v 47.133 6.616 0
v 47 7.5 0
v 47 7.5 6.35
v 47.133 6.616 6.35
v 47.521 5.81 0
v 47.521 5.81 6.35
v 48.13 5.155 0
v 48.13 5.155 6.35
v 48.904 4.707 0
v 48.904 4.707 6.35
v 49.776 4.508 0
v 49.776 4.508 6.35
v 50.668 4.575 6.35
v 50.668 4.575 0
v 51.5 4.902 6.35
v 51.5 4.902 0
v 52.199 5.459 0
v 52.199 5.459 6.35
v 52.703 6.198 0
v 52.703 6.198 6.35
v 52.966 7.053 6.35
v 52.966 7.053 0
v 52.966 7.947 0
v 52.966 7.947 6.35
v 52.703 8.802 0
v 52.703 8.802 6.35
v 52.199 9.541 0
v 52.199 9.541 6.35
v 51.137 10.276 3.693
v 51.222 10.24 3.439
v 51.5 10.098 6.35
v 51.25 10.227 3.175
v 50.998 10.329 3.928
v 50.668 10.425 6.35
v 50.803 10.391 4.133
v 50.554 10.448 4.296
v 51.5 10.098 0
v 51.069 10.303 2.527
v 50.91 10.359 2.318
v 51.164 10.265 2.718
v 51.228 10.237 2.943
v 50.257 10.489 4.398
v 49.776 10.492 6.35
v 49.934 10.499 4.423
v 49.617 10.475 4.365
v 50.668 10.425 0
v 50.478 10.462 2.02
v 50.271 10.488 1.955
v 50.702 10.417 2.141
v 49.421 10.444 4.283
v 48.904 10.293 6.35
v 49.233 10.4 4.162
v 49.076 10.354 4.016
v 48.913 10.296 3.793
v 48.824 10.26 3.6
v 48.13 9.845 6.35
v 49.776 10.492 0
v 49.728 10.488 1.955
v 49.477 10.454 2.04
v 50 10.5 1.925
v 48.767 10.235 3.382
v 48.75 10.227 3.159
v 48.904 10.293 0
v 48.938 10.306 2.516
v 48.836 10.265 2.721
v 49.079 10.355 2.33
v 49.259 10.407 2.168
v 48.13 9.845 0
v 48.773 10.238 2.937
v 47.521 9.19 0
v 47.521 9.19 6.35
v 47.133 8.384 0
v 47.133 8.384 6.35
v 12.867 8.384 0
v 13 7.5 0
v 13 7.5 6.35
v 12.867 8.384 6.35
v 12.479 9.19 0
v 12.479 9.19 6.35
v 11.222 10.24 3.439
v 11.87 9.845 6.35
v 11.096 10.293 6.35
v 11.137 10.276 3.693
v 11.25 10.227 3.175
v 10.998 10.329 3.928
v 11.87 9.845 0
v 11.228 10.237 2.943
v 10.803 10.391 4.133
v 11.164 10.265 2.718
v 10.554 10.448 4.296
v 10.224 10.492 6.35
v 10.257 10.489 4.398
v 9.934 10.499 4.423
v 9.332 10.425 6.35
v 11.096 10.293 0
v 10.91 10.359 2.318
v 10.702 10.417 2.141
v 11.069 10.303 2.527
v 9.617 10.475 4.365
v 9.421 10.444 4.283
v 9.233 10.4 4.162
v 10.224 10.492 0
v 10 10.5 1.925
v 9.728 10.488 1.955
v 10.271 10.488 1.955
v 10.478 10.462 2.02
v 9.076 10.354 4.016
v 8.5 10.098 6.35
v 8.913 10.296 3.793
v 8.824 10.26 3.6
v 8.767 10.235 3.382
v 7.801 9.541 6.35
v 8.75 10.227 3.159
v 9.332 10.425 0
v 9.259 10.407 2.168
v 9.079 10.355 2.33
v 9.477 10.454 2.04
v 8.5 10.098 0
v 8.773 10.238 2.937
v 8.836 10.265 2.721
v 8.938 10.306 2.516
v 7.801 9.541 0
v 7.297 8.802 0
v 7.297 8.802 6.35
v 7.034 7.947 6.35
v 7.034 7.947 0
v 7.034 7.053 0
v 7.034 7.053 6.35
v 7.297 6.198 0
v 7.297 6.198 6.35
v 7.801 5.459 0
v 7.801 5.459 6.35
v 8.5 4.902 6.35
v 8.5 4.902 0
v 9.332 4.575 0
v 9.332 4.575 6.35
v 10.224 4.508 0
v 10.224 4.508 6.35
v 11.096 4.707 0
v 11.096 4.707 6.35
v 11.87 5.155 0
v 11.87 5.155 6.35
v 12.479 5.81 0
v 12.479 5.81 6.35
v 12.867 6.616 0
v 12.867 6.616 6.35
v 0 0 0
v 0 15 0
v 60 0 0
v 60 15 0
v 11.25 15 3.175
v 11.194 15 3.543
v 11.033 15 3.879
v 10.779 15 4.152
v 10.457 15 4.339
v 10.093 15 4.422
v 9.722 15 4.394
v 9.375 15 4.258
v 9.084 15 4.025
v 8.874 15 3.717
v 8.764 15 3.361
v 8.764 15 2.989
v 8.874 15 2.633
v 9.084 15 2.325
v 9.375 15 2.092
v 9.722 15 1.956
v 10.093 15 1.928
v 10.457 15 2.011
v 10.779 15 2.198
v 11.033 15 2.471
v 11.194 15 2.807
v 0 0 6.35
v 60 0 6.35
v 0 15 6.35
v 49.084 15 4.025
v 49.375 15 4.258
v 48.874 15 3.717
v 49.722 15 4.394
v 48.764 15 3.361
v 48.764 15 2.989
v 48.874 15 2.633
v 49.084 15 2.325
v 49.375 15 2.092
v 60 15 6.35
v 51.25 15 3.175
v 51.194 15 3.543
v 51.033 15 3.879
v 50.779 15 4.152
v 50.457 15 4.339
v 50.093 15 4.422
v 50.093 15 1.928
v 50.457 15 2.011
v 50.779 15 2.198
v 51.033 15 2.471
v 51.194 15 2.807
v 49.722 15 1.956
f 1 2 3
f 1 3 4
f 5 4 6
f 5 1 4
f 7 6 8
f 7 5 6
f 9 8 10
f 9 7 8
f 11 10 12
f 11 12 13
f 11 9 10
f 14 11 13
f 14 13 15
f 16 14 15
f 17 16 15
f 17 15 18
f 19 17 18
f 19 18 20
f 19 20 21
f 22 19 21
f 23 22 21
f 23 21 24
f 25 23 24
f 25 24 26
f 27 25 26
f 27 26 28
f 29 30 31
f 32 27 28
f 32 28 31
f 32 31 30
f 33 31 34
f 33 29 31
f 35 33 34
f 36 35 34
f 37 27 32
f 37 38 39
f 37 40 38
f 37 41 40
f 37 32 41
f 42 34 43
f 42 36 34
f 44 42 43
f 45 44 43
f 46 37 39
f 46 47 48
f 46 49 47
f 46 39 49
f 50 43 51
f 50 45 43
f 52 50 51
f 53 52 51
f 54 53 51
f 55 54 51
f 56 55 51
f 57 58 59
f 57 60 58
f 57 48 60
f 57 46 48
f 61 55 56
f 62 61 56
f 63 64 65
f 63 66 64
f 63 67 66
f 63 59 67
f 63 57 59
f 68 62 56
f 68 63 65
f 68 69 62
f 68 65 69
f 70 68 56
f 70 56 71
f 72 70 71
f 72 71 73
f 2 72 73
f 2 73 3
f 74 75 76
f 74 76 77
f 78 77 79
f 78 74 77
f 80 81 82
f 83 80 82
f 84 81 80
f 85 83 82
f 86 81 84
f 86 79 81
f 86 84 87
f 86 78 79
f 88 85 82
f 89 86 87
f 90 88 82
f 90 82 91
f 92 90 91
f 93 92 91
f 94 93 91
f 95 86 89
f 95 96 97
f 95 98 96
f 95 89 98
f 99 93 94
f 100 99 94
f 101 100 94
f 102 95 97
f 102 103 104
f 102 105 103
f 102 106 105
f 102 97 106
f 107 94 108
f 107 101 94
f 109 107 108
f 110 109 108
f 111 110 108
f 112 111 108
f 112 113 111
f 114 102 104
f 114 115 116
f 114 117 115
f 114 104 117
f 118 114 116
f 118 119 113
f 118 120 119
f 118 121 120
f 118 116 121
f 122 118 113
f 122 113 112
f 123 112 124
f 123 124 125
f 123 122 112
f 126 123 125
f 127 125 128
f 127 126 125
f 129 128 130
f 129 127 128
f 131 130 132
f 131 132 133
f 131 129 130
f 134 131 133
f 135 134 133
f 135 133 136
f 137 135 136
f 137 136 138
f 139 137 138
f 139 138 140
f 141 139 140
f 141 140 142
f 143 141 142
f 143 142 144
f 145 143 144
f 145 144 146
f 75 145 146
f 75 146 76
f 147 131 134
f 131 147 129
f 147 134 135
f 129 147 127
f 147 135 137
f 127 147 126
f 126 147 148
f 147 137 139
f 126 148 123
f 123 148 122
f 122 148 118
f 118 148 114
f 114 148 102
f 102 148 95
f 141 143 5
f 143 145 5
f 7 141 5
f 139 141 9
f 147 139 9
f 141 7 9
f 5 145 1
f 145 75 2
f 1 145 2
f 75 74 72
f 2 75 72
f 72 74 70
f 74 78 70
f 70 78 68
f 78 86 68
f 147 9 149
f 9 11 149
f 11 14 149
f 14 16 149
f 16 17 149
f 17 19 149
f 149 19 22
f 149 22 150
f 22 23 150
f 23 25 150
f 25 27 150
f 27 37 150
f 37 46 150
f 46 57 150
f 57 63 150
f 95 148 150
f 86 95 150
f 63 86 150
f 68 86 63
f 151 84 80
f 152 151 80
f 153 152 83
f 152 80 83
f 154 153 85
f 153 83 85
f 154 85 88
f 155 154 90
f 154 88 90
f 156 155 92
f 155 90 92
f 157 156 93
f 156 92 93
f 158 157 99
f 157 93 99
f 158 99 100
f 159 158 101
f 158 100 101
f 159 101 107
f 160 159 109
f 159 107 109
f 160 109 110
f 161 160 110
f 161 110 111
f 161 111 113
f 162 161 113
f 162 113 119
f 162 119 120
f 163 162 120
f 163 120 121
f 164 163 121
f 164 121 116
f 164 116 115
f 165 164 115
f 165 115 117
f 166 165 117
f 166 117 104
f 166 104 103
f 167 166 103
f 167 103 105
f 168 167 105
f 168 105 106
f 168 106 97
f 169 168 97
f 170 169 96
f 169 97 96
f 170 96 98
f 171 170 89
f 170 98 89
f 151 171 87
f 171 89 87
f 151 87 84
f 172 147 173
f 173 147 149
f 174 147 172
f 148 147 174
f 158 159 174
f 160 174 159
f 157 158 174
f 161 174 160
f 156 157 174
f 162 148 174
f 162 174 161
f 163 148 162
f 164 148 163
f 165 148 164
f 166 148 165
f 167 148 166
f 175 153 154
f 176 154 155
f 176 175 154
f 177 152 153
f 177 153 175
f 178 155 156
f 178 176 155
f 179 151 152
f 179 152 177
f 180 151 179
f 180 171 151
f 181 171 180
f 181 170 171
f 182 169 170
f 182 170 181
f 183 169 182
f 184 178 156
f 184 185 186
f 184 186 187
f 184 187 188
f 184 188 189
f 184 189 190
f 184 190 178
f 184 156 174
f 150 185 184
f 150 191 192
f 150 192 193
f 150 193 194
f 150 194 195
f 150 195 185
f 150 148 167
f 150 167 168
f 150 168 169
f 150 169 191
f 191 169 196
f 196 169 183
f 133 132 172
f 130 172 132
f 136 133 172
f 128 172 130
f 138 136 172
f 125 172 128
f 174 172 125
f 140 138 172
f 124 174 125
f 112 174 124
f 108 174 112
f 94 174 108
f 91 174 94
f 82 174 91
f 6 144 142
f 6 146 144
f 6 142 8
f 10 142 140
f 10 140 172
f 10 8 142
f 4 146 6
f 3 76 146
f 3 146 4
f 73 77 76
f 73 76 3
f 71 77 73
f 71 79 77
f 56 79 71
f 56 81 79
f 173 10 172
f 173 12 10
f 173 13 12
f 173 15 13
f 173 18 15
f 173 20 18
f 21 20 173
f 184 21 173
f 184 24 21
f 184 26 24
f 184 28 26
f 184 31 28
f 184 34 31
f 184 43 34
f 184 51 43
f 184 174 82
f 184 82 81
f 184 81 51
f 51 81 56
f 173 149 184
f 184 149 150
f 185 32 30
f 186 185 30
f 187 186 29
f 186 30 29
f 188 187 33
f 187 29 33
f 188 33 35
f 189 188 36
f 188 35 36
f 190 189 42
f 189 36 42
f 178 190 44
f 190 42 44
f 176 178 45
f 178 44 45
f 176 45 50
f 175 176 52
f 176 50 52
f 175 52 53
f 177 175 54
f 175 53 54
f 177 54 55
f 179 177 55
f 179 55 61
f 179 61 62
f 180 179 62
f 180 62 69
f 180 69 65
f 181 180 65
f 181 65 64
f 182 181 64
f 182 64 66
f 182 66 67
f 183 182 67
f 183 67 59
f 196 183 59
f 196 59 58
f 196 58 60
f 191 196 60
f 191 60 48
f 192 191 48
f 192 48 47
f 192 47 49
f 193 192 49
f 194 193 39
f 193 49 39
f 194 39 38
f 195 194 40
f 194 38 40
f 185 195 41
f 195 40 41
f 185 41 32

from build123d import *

# Parameters (mm, degrees)
SKETCH1_W             = 60
SKETCH1_H             = 15
SKETCH1_R             = 3
BOSS_EXTRUDE1_DEPTH   = 6.35
M3_TAPPED_HOLE1_D     = 2.5
M3_TAPPED_HOLE1_DEPTH = 8.5
M3_TAPPED_HOLE1_TIP   = 0.751075774


with BuildPart() as part:
    # Sketch1 → Boss-Extrude1 (new body)
    with BuildSketch(Plane.XY):
        with Locations((30, 7.5)):
            Rectangle(SKETCH1_W, SKETCH1_H)
        with Locations((10, 7.5)):
            Circle(SKETCH1_R, mode=Mode.SUBTRACT)
        with Locations((50, 7.5)):
            Circle(SKETCH1_R, mode=Mode.SUBTRACT)
    extrude(amount=BOSS_EXTRUDE1_DEPTH)

    # M3 Tapped Hole1
    with Locations(Plane(origin=(0, 15, 0), x_dir=(-1, 0, 0), z_dir=(0, 1, 0))):
        with Locations((-10, 3.175), (-50, 3.175)):
            Hole(M3_TAPPED_HOLE1_D / 2, depth=M3_TAPPED_HOLE1_DEPTH)
            with Locations((0, 0, -(M3_TAPPED_HOLE1_DEPTH + M3_TAPPED_HOLE1_TIP / 2))):  # 118° drill point
                Cone(0, M3_TAPPED_HOLE1_D / 2, M3_TAPPED_HOLE1_TIP, mode=Mode.SUBTRACT)


solid = part.part
